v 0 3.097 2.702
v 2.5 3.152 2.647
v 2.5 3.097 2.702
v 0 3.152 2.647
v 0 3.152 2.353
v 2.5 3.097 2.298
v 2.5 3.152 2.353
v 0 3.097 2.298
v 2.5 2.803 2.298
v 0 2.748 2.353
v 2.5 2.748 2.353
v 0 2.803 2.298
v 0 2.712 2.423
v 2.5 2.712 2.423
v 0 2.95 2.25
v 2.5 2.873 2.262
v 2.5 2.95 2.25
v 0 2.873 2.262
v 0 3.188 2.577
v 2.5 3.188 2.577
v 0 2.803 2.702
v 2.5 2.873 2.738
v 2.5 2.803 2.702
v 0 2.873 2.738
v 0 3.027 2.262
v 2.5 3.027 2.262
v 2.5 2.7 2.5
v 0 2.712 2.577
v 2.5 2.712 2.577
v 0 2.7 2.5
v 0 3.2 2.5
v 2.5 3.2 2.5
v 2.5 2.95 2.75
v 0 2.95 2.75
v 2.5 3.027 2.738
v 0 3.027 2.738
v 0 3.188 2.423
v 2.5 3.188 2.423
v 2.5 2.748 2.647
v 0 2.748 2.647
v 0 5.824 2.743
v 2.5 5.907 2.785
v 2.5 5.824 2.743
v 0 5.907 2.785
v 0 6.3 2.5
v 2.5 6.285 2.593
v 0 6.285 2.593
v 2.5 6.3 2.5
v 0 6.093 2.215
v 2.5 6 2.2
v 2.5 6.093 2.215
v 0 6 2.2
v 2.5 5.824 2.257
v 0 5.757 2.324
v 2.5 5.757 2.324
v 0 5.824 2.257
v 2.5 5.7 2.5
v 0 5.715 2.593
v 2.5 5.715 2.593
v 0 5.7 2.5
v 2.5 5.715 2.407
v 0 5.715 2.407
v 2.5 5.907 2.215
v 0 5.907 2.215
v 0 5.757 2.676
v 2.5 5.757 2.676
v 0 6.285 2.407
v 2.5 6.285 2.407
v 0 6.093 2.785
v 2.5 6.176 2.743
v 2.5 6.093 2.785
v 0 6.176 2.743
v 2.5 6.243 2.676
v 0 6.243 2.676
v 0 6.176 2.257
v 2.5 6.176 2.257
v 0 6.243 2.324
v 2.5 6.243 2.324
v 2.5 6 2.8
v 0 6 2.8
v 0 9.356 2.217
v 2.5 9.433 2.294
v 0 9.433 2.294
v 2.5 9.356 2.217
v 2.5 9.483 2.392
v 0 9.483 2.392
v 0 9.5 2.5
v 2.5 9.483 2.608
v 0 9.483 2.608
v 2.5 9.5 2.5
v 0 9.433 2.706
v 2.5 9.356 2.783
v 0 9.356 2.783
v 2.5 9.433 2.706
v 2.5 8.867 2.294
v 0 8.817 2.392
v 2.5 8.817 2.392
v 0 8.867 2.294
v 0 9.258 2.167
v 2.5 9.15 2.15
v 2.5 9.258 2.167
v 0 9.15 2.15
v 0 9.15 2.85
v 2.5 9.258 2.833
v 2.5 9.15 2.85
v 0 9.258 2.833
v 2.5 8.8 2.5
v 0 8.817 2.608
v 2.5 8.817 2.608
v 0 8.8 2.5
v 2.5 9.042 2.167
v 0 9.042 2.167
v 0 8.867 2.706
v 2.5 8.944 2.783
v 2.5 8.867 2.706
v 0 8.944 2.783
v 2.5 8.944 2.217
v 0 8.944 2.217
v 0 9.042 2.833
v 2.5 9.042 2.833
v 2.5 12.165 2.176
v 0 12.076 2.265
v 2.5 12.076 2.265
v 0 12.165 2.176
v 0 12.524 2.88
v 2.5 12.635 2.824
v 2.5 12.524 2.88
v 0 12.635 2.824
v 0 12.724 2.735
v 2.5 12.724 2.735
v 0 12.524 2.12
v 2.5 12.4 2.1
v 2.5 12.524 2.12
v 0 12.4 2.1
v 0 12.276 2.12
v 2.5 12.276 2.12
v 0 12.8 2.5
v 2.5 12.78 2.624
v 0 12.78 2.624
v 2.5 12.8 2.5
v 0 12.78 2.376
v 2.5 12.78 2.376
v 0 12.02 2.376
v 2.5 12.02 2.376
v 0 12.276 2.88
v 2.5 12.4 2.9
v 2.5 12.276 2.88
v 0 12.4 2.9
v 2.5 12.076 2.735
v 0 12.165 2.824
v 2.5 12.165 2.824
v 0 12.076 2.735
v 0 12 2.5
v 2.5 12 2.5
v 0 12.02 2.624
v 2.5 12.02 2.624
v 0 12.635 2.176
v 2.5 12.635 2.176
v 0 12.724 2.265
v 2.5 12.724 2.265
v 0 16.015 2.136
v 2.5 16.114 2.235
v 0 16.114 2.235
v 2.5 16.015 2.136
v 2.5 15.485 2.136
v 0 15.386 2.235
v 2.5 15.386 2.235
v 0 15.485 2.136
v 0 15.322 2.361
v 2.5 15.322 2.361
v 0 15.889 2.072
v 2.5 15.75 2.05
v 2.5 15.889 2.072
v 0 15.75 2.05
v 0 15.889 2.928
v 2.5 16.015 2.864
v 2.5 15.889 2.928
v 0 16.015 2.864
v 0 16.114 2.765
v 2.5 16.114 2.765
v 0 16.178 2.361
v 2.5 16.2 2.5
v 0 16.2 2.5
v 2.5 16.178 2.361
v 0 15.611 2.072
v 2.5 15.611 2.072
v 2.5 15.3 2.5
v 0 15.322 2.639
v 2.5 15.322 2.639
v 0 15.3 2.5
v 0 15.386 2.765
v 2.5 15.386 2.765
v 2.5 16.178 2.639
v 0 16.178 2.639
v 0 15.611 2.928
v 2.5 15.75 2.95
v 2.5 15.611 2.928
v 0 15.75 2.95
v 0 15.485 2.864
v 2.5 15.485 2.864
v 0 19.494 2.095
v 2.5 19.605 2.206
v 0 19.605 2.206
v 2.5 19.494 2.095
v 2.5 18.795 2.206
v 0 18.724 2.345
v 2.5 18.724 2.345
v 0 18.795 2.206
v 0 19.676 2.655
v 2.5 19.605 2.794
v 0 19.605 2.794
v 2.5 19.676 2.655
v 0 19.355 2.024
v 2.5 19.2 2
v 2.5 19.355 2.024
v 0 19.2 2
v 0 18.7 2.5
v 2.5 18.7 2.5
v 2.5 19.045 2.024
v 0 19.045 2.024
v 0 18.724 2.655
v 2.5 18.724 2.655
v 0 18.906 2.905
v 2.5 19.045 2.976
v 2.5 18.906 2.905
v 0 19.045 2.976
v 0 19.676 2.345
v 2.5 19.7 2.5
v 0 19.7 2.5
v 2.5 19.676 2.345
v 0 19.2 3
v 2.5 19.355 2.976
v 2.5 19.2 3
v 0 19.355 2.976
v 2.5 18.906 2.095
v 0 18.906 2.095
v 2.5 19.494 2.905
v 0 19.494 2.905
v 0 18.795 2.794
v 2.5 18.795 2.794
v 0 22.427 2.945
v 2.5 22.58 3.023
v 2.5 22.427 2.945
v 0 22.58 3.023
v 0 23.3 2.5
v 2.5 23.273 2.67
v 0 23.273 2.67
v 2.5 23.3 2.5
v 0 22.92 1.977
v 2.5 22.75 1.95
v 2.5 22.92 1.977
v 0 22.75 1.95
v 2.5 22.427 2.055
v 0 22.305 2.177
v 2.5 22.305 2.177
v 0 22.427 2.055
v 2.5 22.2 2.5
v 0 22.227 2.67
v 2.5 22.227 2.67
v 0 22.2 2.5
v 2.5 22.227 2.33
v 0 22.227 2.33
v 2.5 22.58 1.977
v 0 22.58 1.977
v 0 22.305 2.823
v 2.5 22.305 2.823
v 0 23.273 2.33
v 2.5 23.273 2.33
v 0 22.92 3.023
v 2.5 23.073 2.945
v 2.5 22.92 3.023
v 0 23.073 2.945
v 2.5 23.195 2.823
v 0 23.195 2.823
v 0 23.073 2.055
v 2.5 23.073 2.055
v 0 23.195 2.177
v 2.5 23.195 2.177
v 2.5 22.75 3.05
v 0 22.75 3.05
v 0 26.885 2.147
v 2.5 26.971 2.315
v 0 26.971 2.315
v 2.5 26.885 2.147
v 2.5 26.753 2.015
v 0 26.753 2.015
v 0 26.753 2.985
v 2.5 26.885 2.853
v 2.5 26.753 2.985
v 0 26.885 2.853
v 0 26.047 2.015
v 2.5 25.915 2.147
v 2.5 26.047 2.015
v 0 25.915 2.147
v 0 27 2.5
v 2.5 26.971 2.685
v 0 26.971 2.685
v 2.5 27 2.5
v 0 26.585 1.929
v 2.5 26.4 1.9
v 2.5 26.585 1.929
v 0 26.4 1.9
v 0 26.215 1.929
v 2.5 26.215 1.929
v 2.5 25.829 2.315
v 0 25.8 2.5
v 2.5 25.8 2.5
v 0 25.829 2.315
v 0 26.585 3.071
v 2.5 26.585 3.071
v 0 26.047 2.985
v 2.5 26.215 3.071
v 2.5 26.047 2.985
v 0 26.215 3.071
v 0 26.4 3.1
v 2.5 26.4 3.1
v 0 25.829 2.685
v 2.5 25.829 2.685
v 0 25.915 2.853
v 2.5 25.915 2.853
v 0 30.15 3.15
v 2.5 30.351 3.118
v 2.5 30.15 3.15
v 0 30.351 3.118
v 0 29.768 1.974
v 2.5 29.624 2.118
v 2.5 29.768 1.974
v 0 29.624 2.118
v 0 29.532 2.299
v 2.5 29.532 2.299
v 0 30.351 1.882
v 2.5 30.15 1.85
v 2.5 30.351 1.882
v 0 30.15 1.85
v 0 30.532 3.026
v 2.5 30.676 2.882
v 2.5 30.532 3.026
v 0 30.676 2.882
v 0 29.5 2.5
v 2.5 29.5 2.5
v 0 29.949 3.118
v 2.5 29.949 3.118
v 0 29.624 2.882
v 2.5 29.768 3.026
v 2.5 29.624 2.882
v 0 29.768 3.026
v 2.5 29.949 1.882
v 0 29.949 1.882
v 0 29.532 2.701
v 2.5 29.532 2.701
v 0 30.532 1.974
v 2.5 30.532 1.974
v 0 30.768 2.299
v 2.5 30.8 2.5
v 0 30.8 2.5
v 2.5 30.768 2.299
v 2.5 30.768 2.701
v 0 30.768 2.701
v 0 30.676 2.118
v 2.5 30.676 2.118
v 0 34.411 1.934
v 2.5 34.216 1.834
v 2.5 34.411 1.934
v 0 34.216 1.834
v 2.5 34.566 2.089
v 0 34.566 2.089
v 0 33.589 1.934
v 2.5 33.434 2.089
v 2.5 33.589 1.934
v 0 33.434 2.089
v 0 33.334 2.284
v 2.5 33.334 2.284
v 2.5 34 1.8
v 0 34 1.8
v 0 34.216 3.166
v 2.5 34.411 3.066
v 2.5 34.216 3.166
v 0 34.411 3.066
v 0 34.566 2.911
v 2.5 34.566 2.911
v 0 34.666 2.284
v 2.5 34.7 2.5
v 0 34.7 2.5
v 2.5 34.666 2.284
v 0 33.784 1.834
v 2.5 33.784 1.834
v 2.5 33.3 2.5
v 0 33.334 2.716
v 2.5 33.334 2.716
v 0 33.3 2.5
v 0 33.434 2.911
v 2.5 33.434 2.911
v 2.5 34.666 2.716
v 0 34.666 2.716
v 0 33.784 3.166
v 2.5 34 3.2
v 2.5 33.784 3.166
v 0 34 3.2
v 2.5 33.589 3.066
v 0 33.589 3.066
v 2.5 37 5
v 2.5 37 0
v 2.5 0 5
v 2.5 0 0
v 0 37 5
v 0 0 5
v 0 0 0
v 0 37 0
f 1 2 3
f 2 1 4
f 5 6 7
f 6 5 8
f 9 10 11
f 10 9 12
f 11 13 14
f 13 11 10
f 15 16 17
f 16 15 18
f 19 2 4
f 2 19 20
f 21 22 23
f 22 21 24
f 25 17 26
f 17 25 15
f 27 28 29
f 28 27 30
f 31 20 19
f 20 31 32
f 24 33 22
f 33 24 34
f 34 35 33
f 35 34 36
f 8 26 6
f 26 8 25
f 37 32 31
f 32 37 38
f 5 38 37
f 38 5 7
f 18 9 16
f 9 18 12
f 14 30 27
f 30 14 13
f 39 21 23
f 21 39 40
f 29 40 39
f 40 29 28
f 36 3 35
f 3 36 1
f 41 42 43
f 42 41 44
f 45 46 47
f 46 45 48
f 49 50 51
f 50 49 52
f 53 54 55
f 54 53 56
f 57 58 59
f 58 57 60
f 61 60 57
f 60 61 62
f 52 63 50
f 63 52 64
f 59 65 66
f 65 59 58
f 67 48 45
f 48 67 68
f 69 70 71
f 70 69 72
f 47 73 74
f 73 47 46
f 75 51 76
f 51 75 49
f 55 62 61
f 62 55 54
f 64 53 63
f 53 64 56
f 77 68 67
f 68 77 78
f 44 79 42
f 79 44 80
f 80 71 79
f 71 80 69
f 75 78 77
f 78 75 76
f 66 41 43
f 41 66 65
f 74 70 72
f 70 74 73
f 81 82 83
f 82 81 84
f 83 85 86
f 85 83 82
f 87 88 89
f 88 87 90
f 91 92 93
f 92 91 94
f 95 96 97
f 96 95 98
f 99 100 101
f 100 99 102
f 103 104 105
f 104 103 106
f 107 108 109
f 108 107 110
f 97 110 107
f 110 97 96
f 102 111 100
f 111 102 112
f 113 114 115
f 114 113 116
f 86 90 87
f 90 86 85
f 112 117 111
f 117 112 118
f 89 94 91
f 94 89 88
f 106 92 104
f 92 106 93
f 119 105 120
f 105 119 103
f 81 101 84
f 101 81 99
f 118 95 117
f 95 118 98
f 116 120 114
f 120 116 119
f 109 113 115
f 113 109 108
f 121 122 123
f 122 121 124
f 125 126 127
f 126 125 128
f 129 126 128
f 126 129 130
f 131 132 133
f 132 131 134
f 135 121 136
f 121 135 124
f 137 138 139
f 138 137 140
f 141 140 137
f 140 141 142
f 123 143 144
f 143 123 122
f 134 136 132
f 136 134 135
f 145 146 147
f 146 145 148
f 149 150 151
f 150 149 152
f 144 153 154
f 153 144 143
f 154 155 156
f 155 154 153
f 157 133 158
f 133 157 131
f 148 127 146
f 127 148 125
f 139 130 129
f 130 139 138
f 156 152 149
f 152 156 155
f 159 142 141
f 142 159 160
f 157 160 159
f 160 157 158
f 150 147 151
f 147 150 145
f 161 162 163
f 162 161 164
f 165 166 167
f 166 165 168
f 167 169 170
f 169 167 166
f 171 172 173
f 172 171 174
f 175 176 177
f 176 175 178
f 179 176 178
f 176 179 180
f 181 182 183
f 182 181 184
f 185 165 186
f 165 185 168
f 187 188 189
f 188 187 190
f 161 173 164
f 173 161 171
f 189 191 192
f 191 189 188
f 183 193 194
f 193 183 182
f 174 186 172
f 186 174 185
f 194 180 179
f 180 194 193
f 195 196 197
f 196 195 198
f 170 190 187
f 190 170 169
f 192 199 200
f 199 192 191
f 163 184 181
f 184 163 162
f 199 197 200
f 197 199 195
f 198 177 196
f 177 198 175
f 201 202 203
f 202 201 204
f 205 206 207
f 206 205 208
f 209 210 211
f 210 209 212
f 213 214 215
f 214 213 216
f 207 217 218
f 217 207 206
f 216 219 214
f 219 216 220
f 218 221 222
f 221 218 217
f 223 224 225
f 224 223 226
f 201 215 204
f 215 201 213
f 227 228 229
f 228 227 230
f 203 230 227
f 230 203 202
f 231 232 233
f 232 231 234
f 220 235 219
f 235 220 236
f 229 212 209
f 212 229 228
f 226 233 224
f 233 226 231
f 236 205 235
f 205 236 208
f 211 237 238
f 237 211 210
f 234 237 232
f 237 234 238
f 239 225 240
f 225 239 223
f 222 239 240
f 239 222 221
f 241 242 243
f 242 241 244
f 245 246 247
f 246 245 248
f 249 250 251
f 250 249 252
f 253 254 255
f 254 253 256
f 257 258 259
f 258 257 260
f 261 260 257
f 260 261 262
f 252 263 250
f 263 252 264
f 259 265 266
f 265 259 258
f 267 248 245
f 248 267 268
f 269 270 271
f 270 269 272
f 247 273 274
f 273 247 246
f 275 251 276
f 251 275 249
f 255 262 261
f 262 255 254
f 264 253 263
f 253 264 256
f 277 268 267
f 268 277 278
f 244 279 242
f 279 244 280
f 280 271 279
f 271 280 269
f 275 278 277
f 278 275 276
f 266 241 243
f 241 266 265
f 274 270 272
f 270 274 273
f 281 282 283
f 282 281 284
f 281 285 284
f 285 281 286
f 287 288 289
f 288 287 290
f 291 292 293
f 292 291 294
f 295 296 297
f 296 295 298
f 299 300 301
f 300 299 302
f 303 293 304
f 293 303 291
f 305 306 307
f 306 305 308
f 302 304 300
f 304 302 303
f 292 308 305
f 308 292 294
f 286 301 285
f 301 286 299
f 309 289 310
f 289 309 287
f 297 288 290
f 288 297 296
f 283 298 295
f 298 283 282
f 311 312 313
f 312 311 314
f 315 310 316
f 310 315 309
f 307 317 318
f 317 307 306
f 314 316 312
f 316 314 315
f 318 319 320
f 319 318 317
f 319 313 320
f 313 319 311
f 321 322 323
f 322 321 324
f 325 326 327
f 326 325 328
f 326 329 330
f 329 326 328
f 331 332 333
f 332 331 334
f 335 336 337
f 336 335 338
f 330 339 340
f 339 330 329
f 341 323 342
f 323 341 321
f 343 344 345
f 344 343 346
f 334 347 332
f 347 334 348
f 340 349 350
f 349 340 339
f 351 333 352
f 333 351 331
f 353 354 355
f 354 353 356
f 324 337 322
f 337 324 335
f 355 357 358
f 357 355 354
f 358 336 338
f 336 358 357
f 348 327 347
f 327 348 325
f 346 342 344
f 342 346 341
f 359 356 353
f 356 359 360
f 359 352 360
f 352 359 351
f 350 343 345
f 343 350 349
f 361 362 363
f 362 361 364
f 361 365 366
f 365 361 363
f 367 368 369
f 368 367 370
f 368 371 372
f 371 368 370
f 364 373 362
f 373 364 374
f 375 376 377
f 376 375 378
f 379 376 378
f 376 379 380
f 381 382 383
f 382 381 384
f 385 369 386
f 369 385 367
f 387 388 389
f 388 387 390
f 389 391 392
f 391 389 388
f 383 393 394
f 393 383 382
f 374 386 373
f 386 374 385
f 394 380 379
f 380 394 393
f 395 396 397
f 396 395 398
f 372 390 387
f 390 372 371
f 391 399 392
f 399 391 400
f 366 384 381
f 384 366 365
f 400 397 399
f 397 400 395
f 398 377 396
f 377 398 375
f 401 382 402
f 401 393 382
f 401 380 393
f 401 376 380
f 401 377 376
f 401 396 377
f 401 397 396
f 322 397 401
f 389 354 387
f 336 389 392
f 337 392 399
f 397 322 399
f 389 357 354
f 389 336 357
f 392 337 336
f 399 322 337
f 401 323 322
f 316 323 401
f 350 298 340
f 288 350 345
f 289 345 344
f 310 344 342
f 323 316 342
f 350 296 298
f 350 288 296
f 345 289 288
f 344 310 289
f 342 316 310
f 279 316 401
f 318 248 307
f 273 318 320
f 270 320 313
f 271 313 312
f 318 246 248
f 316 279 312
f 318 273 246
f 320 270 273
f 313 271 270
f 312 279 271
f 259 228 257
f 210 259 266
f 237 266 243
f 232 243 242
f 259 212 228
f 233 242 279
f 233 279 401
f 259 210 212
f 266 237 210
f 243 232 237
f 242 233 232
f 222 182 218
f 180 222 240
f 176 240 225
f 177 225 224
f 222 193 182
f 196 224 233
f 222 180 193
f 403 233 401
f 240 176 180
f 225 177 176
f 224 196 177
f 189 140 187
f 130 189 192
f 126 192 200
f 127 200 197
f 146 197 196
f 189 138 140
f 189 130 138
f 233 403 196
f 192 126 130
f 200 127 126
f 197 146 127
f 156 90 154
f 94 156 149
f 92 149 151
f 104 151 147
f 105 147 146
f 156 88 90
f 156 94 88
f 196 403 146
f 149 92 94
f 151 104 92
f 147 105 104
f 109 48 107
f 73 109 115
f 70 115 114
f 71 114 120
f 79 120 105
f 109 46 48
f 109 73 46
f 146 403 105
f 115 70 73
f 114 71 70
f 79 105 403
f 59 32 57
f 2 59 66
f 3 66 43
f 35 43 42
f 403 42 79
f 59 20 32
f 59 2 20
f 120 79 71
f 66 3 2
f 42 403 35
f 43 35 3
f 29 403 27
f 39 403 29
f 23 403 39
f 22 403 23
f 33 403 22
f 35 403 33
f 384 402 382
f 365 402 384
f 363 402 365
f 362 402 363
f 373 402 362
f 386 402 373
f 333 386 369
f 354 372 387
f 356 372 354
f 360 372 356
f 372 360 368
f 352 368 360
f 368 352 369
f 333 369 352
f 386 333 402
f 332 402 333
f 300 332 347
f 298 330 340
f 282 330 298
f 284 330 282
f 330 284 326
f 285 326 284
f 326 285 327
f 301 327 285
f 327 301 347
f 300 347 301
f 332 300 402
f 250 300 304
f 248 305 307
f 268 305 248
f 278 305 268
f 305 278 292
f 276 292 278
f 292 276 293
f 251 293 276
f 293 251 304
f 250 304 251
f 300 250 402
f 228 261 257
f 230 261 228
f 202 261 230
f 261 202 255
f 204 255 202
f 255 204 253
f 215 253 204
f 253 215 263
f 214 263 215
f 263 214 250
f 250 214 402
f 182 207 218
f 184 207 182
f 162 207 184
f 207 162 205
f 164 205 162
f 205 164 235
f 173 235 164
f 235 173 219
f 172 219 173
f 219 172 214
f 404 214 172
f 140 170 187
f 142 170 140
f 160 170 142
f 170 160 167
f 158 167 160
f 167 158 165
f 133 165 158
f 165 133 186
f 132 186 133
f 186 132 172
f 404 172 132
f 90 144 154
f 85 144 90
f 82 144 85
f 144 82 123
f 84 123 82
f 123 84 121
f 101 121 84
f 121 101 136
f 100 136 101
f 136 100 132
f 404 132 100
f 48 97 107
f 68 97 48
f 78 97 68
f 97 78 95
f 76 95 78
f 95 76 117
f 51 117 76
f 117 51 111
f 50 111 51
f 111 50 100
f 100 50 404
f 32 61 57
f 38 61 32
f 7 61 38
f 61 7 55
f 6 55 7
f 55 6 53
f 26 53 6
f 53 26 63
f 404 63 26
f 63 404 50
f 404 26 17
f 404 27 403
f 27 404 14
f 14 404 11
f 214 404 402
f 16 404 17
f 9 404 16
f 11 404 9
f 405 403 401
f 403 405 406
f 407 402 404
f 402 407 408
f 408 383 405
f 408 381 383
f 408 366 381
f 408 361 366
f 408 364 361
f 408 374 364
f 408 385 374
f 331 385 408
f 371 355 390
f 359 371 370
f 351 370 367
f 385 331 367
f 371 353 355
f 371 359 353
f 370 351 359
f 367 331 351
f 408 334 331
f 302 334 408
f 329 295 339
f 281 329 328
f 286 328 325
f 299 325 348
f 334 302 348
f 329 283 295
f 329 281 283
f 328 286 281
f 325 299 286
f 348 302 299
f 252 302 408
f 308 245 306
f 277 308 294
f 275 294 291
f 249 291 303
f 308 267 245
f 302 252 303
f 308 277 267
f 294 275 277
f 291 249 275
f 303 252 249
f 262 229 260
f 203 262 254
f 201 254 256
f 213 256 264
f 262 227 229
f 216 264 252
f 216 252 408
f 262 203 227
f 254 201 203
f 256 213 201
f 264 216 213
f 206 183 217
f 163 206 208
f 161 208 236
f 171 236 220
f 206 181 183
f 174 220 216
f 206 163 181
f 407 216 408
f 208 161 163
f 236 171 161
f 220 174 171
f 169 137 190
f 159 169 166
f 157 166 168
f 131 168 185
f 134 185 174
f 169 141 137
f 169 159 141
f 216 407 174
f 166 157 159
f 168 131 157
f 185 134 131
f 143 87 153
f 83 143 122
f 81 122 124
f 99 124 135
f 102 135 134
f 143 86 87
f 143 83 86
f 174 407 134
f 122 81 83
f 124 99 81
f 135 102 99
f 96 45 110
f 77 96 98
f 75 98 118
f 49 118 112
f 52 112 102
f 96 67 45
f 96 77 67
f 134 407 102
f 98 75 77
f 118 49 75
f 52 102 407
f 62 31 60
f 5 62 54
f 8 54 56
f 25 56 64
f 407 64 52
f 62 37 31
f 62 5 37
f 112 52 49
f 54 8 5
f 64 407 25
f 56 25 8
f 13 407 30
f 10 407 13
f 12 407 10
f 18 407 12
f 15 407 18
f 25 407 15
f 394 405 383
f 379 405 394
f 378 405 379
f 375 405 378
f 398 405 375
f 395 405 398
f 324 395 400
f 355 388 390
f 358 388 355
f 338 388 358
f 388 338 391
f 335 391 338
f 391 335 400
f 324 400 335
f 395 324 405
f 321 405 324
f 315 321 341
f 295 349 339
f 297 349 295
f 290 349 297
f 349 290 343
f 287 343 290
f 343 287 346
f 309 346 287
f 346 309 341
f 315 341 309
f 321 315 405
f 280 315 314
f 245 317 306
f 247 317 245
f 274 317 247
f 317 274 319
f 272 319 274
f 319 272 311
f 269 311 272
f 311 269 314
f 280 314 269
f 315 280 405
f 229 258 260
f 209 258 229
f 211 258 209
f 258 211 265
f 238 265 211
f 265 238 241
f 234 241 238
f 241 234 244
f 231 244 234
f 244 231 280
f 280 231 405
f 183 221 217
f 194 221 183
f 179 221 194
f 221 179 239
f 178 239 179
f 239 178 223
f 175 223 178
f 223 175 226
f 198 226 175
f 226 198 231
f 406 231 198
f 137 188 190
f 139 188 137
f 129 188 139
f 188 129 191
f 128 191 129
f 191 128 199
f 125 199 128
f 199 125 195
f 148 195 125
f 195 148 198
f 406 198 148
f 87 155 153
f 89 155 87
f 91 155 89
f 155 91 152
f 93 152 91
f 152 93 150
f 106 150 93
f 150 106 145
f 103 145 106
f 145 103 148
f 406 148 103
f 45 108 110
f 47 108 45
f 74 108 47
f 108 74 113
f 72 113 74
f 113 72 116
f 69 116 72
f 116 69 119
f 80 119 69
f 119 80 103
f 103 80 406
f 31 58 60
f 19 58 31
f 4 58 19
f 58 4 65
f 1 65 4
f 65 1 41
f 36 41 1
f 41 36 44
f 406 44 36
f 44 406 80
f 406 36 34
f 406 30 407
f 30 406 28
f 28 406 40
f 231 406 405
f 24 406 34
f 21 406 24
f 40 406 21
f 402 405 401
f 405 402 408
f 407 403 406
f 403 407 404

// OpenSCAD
distance = 2;

difference(){
cube([2.5,37,5]);

union(){






for (i = [1:10])
{

assign(distance = distance +  0.5+0.05*i)

translate([5,distance*i+ 0.4*i,2.5 ]) rotate([0,90,0]) translate([0,0,-10]) 	cylinder(r=0.2+0.05*i,h=10,$fn=20);

}

//distance = distance+2.5;

//translate([5,distance,2.5]) rotate([0,90,0]) translate([0,0,-10]) 	cylinder(r=0.5,h=10,$fn=20);
}
}
